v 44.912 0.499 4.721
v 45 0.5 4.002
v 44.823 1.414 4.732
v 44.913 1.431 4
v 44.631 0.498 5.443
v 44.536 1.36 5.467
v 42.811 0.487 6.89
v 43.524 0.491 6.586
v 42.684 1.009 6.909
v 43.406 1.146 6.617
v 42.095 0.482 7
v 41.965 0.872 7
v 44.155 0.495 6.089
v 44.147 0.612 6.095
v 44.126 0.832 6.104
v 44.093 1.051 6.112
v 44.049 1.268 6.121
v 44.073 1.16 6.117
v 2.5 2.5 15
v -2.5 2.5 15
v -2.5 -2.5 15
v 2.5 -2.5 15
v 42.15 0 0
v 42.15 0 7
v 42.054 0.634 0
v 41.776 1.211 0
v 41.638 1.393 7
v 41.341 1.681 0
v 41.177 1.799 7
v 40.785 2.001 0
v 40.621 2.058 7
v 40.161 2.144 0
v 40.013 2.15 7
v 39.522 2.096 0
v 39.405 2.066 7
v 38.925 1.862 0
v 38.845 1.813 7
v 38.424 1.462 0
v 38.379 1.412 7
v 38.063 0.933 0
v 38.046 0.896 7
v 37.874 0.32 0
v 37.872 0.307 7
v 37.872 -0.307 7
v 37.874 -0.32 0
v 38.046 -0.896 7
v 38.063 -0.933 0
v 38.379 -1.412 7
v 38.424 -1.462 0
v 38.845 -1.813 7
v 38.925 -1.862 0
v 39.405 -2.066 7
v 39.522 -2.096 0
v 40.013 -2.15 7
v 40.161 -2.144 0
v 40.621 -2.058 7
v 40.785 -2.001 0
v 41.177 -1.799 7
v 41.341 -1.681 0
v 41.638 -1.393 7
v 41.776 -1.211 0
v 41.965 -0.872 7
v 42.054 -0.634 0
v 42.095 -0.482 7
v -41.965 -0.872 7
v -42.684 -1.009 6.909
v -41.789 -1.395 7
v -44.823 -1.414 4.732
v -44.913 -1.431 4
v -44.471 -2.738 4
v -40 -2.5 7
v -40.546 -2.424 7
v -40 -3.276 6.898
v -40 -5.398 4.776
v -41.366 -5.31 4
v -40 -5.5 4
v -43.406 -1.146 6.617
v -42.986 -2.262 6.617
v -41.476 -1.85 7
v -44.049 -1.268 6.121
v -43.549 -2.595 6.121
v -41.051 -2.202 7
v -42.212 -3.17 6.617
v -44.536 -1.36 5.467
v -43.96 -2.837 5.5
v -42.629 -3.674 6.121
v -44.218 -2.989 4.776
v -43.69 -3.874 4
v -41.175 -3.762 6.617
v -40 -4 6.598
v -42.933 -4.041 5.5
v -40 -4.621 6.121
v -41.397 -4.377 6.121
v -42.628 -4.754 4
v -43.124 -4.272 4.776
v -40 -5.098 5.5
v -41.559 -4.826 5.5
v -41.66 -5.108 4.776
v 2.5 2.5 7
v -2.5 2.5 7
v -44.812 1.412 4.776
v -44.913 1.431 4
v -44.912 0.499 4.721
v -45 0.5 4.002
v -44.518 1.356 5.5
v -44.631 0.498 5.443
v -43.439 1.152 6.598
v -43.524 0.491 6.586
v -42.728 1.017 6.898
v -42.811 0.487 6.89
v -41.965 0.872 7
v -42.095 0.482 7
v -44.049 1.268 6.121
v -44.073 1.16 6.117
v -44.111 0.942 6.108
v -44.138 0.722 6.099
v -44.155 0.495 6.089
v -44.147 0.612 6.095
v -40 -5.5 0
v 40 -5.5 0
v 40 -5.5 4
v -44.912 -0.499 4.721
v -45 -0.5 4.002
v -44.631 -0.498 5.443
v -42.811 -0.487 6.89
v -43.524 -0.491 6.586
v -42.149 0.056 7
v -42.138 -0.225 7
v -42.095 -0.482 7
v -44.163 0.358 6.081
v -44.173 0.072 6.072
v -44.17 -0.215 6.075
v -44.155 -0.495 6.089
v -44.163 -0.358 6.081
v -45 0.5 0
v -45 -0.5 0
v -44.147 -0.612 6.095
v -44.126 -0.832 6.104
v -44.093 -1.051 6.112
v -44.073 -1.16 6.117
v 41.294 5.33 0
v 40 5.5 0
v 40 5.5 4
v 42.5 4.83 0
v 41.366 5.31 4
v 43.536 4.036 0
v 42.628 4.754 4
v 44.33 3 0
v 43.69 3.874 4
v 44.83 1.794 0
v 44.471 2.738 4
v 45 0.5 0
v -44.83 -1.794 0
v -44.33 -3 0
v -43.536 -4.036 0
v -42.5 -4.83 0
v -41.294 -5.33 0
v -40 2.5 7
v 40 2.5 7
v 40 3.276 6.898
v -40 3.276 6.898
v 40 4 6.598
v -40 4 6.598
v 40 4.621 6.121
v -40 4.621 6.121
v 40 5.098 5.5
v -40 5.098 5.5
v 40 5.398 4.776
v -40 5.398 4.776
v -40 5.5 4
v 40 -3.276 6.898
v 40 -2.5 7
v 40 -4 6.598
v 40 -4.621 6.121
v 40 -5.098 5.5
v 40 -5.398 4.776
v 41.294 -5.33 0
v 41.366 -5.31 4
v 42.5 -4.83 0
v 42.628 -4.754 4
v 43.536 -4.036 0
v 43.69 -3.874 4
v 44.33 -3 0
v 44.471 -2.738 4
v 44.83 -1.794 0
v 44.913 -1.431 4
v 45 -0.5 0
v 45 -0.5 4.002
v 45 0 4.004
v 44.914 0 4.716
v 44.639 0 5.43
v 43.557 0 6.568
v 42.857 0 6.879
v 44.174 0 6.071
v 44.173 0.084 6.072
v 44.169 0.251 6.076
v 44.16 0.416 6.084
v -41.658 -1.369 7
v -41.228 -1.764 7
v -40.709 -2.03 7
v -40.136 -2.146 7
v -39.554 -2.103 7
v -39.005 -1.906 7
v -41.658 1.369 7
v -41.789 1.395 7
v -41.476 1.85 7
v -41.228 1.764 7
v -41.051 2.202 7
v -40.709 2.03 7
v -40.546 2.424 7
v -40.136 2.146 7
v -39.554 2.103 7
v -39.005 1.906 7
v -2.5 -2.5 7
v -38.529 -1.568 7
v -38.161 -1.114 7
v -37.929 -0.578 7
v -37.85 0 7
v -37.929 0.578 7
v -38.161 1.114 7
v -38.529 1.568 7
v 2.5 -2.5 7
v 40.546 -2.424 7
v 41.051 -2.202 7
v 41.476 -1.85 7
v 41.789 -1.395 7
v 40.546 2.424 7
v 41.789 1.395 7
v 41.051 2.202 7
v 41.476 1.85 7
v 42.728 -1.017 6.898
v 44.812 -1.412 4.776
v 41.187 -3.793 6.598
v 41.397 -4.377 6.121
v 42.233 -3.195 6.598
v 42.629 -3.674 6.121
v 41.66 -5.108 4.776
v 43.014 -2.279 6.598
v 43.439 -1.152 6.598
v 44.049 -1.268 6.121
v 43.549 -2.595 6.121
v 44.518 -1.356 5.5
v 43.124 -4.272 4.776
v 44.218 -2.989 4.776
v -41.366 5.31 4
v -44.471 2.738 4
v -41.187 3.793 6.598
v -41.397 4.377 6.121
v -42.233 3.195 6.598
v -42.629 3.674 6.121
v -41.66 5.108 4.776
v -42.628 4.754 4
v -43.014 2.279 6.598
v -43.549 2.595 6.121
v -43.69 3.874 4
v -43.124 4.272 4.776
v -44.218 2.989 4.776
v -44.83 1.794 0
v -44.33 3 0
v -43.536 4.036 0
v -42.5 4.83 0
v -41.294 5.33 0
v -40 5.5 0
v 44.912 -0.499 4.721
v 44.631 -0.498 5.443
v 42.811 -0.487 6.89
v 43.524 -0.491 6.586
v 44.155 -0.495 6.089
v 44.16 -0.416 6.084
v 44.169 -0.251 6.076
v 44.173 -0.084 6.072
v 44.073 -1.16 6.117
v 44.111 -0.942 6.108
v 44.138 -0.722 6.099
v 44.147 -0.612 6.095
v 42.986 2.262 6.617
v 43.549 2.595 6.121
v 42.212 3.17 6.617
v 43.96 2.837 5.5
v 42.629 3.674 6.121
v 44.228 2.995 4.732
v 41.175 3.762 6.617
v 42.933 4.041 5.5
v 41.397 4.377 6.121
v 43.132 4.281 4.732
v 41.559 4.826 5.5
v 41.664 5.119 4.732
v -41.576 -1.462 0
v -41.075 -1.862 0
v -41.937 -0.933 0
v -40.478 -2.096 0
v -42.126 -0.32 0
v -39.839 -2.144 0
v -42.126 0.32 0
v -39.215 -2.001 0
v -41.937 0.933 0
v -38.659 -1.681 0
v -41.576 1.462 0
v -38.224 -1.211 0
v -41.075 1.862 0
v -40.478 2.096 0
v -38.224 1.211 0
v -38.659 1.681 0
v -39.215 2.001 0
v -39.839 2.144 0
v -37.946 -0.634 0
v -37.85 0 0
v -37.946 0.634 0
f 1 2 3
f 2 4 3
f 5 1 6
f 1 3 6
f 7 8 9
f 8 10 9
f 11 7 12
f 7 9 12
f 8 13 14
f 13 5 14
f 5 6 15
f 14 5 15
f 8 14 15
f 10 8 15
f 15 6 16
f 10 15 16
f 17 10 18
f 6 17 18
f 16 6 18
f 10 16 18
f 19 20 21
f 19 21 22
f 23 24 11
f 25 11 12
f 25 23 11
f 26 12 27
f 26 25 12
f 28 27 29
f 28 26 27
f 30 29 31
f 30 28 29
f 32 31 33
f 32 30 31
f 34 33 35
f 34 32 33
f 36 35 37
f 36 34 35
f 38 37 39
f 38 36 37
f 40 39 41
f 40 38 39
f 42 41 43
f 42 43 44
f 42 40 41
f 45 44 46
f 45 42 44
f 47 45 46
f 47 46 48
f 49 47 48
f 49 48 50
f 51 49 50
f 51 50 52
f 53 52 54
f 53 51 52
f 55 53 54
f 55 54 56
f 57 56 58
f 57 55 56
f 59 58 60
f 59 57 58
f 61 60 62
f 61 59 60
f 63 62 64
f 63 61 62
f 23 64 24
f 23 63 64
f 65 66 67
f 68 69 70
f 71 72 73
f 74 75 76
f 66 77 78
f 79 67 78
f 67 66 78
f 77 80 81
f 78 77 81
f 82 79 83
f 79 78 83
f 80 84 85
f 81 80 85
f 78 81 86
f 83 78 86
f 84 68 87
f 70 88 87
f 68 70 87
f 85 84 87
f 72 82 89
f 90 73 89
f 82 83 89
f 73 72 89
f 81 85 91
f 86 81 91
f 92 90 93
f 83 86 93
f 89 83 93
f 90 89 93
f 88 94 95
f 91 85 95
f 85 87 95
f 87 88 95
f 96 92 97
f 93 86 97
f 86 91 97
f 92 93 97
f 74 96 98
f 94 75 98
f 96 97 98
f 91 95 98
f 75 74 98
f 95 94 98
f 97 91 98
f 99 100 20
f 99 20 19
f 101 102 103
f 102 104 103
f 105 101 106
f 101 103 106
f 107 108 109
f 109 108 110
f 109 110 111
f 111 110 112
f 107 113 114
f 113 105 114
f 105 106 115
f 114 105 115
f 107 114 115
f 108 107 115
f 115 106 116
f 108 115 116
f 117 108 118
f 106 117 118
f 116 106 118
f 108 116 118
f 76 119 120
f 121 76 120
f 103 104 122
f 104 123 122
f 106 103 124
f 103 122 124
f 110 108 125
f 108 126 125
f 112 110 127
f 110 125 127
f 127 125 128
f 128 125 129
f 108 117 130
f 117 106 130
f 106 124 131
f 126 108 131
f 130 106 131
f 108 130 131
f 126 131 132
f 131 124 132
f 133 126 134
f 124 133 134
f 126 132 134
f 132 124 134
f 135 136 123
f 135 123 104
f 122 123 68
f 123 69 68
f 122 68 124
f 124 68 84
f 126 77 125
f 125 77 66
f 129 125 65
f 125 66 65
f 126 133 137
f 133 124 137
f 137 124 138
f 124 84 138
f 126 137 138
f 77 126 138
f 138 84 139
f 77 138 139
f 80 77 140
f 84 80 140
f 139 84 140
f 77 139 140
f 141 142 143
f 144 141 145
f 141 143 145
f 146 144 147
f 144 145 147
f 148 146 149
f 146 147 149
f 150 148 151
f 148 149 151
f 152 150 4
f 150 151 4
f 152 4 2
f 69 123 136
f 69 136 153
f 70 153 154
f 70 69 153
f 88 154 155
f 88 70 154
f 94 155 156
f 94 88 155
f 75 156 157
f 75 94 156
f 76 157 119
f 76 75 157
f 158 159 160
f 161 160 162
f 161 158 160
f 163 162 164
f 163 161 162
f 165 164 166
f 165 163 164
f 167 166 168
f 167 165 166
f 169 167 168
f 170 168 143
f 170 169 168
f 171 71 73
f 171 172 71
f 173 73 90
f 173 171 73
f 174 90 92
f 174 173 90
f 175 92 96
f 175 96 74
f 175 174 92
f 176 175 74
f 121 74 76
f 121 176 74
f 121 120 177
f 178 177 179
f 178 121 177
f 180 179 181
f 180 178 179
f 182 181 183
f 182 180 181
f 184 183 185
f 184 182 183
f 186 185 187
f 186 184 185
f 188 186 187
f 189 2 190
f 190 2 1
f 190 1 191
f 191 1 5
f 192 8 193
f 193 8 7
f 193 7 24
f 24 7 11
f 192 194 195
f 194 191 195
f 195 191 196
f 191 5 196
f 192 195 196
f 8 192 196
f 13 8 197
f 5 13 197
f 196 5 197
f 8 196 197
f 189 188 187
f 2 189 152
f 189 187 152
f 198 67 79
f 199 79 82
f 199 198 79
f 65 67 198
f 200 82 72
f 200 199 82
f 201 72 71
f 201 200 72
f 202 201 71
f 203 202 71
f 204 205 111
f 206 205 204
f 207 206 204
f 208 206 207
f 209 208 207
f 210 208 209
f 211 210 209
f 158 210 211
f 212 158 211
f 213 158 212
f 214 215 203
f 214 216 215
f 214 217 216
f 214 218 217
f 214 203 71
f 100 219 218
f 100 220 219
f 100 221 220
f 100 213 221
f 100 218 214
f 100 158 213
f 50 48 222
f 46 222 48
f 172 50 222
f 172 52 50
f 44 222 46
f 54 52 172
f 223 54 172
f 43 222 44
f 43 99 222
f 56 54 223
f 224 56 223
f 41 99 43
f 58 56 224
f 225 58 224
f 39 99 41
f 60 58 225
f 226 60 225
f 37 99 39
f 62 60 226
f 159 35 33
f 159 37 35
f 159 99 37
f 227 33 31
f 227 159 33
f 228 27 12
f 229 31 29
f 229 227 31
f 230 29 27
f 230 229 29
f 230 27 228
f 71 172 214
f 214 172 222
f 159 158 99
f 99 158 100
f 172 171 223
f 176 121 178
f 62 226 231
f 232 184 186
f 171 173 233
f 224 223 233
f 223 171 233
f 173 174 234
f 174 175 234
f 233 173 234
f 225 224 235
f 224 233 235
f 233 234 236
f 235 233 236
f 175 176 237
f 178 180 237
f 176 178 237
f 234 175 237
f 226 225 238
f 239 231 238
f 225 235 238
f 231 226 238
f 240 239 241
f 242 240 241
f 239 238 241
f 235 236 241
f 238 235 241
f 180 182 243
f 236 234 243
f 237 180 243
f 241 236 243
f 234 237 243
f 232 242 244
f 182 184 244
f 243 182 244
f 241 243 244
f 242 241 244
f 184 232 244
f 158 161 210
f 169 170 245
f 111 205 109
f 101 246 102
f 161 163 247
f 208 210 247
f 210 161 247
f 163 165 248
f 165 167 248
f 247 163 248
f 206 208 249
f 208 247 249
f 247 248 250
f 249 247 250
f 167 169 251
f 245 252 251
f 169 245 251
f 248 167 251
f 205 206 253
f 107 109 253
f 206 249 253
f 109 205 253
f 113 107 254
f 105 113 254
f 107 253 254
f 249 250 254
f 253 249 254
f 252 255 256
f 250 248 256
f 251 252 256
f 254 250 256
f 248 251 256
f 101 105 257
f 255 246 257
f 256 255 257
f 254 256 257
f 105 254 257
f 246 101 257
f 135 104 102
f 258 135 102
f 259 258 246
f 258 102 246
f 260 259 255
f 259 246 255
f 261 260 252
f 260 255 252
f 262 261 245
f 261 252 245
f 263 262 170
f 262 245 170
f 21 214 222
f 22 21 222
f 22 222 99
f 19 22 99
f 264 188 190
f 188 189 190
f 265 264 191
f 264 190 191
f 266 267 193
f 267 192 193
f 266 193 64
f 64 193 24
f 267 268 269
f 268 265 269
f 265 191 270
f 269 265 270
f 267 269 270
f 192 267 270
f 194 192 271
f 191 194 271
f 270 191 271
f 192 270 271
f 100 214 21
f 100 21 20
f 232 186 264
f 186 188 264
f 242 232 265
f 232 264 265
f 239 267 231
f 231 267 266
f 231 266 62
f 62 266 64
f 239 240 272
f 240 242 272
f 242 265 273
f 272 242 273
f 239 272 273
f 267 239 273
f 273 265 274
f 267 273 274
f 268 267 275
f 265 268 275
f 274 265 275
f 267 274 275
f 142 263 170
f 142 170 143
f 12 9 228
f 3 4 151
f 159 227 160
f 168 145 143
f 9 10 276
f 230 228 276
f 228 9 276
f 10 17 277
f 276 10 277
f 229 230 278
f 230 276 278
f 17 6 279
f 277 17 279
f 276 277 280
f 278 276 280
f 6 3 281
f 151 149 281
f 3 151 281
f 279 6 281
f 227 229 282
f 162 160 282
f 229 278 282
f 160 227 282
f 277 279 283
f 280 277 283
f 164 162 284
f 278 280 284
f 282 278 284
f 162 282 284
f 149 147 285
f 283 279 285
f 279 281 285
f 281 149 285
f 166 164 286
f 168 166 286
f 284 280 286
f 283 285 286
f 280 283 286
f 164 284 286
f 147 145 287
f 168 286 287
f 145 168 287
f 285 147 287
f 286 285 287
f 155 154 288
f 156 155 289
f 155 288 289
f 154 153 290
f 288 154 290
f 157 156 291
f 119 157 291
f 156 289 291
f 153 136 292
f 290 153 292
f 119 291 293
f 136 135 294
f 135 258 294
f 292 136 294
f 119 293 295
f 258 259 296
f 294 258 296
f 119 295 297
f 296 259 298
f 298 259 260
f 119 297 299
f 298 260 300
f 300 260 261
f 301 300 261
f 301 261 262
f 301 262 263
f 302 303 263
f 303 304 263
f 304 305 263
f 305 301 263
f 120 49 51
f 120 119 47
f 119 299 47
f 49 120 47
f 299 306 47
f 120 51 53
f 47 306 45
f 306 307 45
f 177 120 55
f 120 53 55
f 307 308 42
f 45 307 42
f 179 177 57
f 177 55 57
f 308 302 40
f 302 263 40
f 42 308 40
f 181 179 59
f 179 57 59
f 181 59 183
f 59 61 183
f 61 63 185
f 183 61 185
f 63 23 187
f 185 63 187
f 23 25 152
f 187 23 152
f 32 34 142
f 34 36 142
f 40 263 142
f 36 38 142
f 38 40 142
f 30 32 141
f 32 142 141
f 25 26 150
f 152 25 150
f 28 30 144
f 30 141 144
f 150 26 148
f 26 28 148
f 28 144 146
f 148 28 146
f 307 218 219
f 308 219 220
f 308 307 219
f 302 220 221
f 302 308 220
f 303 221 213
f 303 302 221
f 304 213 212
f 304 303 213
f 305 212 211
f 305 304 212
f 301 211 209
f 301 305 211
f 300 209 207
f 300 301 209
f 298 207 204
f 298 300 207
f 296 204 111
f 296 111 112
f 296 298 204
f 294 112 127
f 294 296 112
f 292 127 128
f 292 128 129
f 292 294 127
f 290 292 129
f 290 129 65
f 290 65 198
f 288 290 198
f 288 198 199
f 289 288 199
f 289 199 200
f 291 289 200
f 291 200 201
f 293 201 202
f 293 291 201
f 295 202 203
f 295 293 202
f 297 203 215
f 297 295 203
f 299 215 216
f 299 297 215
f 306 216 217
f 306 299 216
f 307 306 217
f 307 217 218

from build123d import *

# Parameters (mm, degrees)
F0_W     = 90
F0_H     = 11
F0_R     = 2.15
F0_R_2   = 2.25
F1_DEPTH = 7
F2_W     = 5
F2_H     = 5
F3_DEPTH = 8
F4_R     = 5
F5_R     = 2.99999


# Not quite as in the source:
# - a fillet or chamfer is up to 0.001 mm smaller than in the source, because OpenCascade refuses the exact size


with BuildPart() as f1:
    # F0 (on Top) → F1 (new body)
    with BuildSketch(Plane.XY):
        Rectangle(F0_W, F0_H)
        with Locations((-40, 0)):
            Circle(F0_R, mode=Mode.SUBTRACT)
        Circle(F0_R_2, mode=Mode.SUBTRACT)
        with Locations((40, 0)):
            Circle(F0_R, mode=Mode.SUBTRACT)
        Circle(F0_R_2)
    extrude(amount=F1_DEPTH)

    # F2 (on face) → F3 (join)
    with BuildSketch(Plane.XY.offset(7)):
        Rectangle(F2_W, F2_H)
    extrude(amount=F3_DEPTH)

    # F4
    f4_edges = [f1.edges().sort_by_distance(p)[0] for p in [
        (45, -5.5, 3.5),
        (45, 5.5, 3.5),
        (-45, -5.5, 3.5),
        (-45, 5.5, 3.5),
    ]]
    fillet(f4_edges, radius=F4_R)

    # F5 (radius 3 in the source; OpenCascade refuses exactly that, so slightly less here)
    f5_edges = [f1.edges().sort_by_distance(p)[0] for p in [
        (0, -5.5, 7),
    ]]
    fillet(f5_edges, radius=F5_R)


solid = f1.part
